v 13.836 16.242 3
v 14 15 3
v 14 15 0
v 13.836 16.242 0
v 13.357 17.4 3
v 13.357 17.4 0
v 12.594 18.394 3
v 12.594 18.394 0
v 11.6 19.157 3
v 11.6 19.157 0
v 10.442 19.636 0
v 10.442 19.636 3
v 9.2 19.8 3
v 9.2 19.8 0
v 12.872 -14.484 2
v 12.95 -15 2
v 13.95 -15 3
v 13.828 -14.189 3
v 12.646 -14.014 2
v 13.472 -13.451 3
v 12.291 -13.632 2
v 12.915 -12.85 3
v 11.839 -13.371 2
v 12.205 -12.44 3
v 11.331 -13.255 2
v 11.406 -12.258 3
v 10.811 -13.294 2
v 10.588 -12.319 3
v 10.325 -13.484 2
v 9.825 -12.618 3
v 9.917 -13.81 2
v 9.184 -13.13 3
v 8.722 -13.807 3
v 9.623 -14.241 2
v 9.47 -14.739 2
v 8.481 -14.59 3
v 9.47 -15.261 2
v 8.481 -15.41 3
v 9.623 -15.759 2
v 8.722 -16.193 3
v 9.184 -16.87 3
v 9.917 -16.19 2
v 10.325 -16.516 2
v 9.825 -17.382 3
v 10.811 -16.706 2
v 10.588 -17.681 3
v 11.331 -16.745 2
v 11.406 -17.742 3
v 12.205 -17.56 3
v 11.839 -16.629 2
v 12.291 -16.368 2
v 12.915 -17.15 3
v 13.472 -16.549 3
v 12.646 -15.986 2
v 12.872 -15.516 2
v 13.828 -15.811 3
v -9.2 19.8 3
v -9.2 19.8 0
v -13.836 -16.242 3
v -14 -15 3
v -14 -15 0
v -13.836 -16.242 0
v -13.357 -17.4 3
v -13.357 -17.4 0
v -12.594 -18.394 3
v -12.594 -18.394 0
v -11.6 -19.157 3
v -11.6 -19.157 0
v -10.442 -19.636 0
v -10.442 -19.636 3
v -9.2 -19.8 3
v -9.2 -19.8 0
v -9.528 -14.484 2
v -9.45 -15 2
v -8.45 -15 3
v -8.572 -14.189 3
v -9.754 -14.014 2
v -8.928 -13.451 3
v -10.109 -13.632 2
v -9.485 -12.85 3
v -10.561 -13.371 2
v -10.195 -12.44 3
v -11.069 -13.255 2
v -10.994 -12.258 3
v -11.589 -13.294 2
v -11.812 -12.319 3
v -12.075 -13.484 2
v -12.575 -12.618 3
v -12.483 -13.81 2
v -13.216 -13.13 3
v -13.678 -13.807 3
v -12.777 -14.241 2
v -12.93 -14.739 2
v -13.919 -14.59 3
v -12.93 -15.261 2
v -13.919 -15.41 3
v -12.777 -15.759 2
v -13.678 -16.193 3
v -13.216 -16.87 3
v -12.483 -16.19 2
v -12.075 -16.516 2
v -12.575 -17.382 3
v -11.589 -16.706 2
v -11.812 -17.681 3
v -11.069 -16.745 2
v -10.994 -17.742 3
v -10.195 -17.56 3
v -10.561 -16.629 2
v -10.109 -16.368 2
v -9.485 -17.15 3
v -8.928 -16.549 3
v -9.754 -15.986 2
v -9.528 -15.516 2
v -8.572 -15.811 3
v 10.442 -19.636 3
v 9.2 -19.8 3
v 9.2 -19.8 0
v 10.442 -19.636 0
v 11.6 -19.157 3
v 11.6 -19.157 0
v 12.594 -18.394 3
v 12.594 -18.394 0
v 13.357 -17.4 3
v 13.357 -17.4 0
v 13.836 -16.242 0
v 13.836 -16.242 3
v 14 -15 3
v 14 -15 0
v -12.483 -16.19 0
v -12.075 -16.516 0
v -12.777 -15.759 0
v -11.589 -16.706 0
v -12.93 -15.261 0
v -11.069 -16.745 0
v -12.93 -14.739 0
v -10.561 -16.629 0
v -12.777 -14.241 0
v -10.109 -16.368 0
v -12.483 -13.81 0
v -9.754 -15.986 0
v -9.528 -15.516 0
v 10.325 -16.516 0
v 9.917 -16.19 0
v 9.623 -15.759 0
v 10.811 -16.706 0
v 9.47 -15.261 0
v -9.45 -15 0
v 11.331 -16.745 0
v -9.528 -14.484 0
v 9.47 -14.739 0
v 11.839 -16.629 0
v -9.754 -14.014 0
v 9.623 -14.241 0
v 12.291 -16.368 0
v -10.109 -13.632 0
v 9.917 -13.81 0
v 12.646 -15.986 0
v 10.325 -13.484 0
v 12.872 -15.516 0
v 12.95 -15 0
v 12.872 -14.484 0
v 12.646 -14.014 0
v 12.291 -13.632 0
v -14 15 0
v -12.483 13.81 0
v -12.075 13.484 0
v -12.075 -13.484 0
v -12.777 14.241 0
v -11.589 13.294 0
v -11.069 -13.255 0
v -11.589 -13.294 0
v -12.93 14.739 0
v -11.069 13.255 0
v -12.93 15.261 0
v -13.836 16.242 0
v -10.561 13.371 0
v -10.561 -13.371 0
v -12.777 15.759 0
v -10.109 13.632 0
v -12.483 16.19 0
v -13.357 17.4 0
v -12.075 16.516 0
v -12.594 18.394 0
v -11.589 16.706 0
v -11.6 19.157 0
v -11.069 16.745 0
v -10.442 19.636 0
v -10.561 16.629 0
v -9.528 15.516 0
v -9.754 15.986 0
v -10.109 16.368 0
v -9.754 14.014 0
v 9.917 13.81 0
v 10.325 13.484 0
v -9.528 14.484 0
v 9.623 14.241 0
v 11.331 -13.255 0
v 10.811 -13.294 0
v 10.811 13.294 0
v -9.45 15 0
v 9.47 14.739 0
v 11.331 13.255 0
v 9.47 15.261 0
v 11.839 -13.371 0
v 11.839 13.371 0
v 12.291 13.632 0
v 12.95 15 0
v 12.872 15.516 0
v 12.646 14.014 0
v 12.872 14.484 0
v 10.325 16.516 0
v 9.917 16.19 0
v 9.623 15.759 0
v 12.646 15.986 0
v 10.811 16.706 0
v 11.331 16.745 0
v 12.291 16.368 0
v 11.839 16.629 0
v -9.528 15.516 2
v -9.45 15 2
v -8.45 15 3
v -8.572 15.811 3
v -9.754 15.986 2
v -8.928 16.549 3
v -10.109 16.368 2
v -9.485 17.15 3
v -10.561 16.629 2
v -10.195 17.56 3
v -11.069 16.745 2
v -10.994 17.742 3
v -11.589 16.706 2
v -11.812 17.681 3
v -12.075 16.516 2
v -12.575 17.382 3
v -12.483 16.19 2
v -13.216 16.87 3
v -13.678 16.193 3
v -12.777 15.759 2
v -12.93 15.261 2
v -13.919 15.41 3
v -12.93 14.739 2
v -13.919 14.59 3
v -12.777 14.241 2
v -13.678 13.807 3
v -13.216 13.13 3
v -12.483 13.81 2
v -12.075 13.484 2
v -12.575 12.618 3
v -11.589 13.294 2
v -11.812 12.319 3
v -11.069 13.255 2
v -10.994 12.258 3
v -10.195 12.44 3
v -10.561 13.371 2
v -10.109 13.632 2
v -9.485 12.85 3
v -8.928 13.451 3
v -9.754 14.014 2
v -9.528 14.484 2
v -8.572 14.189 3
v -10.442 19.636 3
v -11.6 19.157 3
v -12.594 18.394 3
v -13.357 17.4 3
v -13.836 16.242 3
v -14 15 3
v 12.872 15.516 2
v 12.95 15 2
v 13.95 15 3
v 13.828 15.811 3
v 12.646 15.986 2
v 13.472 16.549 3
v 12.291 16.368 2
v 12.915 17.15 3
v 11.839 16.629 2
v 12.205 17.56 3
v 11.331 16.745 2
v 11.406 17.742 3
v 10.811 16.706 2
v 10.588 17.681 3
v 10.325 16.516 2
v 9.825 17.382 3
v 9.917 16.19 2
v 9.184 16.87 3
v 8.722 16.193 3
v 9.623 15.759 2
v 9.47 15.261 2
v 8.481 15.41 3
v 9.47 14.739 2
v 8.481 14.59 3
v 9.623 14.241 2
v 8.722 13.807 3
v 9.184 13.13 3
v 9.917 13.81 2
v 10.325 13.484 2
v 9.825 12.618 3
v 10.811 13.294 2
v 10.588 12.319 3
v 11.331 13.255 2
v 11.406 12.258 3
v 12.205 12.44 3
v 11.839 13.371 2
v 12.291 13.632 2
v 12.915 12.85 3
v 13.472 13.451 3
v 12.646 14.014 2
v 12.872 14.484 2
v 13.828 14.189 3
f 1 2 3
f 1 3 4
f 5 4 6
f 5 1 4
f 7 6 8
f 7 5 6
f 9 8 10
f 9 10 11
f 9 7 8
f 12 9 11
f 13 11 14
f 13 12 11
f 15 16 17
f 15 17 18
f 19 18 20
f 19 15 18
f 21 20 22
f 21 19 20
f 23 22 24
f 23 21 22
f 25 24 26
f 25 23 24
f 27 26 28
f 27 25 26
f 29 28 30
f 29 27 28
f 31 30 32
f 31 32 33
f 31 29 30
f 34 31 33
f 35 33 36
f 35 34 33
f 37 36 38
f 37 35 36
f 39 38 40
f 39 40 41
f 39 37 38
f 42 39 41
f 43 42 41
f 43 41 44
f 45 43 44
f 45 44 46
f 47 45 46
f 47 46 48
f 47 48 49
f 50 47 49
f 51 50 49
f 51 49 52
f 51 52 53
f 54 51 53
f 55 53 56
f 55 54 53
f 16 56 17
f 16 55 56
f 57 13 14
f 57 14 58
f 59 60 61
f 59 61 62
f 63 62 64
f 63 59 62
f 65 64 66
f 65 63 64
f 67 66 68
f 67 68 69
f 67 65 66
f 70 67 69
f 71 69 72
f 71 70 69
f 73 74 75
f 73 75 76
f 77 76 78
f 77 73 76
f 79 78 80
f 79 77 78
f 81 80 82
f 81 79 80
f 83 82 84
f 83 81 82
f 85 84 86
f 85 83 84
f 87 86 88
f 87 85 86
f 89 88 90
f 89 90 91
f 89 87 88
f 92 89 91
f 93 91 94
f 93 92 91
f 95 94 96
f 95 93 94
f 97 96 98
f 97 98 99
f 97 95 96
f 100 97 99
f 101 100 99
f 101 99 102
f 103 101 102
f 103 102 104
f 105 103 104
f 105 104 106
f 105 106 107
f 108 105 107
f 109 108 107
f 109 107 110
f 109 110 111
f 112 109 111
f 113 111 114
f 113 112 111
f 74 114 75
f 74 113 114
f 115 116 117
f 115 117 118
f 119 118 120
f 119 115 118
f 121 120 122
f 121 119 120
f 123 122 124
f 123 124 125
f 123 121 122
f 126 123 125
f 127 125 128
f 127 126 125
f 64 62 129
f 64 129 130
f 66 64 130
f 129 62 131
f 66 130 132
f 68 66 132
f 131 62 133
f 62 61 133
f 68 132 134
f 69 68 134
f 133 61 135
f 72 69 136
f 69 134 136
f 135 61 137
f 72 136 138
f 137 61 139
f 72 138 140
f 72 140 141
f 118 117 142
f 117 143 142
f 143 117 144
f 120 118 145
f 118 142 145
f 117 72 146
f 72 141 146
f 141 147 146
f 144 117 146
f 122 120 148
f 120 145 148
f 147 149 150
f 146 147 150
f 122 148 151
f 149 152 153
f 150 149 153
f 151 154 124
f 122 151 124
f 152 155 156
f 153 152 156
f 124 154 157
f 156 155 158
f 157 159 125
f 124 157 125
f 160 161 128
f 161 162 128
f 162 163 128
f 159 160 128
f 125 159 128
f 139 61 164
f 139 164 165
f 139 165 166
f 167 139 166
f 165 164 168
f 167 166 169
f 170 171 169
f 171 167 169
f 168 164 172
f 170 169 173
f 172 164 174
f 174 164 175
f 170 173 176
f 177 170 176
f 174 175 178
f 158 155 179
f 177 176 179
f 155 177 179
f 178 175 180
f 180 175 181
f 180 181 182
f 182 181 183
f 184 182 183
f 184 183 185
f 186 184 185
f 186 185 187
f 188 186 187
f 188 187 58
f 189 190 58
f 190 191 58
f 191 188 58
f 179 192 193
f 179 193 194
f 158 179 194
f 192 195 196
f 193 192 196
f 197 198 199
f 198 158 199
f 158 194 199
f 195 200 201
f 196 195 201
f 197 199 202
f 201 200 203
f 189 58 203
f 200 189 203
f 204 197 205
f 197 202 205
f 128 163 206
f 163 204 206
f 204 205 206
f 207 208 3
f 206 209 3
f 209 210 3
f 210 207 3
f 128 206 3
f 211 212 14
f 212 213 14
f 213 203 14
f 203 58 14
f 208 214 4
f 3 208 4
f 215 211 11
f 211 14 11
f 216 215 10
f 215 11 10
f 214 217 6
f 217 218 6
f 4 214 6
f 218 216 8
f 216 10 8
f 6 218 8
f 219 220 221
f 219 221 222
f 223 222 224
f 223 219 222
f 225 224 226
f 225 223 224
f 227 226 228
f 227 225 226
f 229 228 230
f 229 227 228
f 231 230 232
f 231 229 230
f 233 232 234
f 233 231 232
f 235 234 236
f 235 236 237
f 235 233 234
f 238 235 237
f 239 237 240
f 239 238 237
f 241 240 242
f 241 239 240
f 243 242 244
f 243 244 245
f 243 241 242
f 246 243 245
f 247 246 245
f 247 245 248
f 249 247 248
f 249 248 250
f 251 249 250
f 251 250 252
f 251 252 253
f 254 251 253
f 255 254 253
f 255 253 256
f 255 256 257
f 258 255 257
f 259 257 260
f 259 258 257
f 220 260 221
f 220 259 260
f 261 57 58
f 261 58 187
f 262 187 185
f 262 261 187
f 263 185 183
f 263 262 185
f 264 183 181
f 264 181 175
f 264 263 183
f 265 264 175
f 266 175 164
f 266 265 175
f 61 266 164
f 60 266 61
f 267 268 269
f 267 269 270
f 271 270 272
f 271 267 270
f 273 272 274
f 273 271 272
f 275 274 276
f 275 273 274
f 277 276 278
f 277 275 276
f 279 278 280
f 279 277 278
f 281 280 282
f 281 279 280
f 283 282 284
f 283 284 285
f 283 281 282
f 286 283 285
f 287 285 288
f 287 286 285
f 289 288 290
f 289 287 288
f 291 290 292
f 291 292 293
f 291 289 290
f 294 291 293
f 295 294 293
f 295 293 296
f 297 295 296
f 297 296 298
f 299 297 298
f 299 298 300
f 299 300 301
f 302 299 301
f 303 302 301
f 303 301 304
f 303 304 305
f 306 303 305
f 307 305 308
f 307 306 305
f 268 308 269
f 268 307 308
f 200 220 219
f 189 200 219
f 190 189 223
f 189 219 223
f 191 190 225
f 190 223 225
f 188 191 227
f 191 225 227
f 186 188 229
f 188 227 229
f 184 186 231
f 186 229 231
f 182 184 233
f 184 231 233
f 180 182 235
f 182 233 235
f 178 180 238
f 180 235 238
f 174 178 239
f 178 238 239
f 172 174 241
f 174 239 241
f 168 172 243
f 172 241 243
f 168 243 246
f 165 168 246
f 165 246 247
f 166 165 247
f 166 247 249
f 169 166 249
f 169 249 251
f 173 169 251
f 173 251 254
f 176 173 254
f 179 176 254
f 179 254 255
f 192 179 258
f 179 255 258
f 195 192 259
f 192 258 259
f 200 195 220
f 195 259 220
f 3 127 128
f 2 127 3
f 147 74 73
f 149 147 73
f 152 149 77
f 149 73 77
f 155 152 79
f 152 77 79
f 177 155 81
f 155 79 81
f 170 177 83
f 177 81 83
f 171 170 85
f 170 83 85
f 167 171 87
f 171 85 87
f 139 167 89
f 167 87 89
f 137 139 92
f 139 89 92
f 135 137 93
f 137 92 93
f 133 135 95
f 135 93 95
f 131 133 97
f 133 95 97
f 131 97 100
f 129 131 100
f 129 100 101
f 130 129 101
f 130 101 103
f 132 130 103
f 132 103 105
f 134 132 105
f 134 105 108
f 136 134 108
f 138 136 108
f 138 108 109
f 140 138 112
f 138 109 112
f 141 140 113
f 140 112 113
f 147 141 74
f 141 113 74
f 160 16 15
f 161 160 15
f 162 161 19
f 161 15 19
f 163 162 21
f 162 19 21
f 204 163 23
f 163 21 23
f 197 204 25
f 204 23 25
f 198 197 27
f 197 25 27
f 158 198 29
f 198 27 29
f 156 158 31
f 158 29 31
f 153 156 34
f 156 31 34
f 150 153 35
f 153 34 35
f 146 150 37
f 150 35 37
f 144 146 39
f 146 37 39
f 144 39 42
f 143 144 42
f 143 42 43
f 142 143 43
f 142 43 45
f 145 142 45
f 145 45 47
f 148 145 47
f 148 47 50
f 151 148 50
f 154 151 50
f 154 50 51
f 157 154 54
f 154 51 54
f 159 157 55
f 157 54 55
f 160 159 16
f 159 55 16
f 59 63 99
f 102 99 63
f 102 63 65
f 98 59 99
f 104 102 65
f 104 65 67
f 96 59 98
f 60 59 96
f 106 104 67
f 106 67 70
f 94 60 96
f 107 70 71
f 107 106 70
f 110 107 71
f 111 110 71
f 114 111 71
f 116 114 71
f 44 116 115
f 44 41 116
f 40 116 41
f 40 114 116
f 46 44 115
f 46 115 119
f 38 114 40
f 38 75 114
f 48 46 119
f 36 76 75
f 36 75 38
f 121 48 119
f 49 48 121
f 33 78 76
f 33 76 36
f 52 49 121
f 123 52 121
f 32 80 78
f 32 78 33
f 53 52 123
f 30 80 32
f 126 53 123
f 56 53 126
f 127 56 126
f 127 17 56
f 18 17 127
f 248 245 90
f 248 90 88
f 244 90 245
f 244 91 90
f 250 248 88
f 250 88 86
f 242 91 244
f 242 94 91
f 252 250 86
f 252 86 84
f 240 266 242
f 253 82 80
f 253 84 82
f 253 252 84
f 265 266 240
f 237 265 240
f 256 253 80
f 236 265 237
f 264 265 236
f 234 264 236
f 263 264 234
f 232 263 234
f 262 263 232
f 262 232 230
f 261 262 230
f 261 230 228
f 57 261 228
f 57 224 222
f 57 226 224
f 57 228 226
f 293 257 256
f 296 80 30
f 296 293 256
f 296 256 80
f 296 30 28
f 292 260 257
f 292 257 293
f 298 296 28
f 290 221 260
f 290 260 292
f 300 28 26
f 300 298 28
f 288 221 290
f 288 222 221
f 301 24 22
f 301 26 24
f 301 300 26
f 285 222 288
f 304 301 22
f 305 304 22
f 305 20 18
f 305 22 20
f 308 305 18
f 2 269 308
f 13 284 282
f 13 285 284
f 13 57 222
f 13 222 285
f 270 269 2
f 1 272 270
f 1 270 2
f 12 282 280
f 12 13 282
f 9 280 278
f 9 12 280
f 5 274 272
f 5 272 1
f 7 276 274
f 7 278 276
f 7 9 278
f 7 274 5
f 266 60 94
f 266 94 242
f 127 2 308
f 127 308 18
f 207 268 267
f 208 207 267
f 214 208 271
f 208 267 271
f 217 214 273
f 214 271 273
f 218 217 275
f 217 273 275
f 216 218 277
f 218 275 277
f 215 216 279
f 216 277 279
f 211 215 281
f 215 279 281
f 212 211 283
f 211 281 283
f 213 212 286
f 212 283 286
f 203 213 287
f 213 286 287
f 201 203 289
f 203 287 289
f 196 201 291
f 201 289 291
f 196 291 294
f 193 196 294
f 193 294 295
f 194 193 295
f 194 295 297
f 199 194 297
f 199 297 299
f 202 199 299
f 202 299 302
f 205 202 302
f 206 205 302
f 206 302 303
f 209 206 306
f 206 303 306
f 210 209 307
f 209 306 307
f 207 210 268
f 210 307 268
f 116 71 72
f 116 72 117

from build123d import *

# Parameters (mm, degrees)
SZKIC1_W                    = 28.4
SZKIC1_H                    = 40
DODANIE_WYCI_GNI_CIE1_DEPTH = 3
ZAOKR_GLENIE1_R             = 5
SZKIC2_R                    = 1.75
WYTNIJ_WYCI_GNI_CIE1_DEPTH  = 3
SFAZOWANIE1_SIZE            = 1
WYTNIJ_WYCI_GNI_CIE2_DEPTH  = 3


with BuildPart() as part:
    # Szkic1 → Dodanie-wyciągnięcie1 (new body)
    with BuildSketch(Plane.XY):
        Rectangle(SZKIC1_W, SZKIC1_H)
    extrude(amount=DODANIE_WYCI_GNI_CIE1_DEPTH)

    # Zaokrąglenie1
    zaokr_glenie1_edges = [part.edges().sort_by_distance(p)[0] for p in [
        (14.2, -20, 1.5),
        (-14.2, -20, 1.5),
        (-14.2, 20, 1.5),
        (14.2, 20, 1.5),
    ]]
    fillet(zaokr_glenie1_edges, radius=ZAOKR_GLENIE1_R)

    # Szkic2 → Wytnij-wyciągnięcie1 (cut)
    with BuildSketch(Plane.XY.offset(3)):
        with Locations((-11.2, 15)):
            Circle(SZKIC2_R)
        with Locations((11.2, 15)):
            Circle(SZKIC2_R)
        with Locations((-11.2, -15)):
            Circle(SZKIC2_R)
        with Locations((11.2, -15)):
            Circle(SZKIC2_R)
    extrude(amount=-WYTNIJ_WYCI_GNI_CIE1_DEPTH, mode=Mode.SUBTRACT)

    # Sfazowanie1
    sfazowanie1_edges = [part.edges().sort_by_distance(p)[0] for p in [
        (9.45, 15, 3),
        (-12.95, -15, 3),
        (9.45, -15, 3),
        (-12.95, 15, 3),
    ]]
    chamfer(sfazowanie1_edges, length=SFAZOWANIE1_SIZE)

    # Szkic3 → Wytnij-wyciągnięcie2 (cut)
    with BuildSketch(Plane.XY.offset(3)):
        with BuildLine():
            Line((-14.2, 15), (-14.2, -15))
            ThreePointArc((-14.2, -15), (-12.735533906, -18.535533906), (-9.2, -20))
            Line((-9.2, -20), (9.2, -20))
            ThreePointArc((9.2, -20), (12.735533906, -18.535533906), (14.2, -15))
            Line((14.2, -15), (14.2, 15))
            ThreePointArc((14.2, 15), (12.735533906, 18.535533906), (9.2, 20))
            Line((9.2, 20), (-9.2, 20))
            ThreePointArc((-9.2, 20), (-12.735533906, 18.535533906), (-14.2, 15))
        make_face()
        with BuildLine():
            Line((9.2, 19.8), (-9.2, 19.8))
            ThreePointArc((-9.2, 19.8), (-12.59411255, 18.39411255), (-14, 15))
            Line((-14, 15), (-14, -15))
            ThreePointArc((-14, -15), (-12.59411255, -18.39411255), (-9.2, -19.8))
            Line((-9.2, -19.8), (9.2, -19.8))
            ThreePointArc((9.2, -19.8), (12.59411255, -18.39411255), (14, -15))
            Line((14, -15), (14, 15))
            ThreePointArc((14, 15), (12.59411255, 18.39411255), (9.2, 19.8))
        make_face(mode=Mode.SUBTRACT)
    extrude(amount=-WYTNIJ_WYCI_GNI_CIE2_DEPTH, mode=Mode.SUBTRACT)


solid = part.part
